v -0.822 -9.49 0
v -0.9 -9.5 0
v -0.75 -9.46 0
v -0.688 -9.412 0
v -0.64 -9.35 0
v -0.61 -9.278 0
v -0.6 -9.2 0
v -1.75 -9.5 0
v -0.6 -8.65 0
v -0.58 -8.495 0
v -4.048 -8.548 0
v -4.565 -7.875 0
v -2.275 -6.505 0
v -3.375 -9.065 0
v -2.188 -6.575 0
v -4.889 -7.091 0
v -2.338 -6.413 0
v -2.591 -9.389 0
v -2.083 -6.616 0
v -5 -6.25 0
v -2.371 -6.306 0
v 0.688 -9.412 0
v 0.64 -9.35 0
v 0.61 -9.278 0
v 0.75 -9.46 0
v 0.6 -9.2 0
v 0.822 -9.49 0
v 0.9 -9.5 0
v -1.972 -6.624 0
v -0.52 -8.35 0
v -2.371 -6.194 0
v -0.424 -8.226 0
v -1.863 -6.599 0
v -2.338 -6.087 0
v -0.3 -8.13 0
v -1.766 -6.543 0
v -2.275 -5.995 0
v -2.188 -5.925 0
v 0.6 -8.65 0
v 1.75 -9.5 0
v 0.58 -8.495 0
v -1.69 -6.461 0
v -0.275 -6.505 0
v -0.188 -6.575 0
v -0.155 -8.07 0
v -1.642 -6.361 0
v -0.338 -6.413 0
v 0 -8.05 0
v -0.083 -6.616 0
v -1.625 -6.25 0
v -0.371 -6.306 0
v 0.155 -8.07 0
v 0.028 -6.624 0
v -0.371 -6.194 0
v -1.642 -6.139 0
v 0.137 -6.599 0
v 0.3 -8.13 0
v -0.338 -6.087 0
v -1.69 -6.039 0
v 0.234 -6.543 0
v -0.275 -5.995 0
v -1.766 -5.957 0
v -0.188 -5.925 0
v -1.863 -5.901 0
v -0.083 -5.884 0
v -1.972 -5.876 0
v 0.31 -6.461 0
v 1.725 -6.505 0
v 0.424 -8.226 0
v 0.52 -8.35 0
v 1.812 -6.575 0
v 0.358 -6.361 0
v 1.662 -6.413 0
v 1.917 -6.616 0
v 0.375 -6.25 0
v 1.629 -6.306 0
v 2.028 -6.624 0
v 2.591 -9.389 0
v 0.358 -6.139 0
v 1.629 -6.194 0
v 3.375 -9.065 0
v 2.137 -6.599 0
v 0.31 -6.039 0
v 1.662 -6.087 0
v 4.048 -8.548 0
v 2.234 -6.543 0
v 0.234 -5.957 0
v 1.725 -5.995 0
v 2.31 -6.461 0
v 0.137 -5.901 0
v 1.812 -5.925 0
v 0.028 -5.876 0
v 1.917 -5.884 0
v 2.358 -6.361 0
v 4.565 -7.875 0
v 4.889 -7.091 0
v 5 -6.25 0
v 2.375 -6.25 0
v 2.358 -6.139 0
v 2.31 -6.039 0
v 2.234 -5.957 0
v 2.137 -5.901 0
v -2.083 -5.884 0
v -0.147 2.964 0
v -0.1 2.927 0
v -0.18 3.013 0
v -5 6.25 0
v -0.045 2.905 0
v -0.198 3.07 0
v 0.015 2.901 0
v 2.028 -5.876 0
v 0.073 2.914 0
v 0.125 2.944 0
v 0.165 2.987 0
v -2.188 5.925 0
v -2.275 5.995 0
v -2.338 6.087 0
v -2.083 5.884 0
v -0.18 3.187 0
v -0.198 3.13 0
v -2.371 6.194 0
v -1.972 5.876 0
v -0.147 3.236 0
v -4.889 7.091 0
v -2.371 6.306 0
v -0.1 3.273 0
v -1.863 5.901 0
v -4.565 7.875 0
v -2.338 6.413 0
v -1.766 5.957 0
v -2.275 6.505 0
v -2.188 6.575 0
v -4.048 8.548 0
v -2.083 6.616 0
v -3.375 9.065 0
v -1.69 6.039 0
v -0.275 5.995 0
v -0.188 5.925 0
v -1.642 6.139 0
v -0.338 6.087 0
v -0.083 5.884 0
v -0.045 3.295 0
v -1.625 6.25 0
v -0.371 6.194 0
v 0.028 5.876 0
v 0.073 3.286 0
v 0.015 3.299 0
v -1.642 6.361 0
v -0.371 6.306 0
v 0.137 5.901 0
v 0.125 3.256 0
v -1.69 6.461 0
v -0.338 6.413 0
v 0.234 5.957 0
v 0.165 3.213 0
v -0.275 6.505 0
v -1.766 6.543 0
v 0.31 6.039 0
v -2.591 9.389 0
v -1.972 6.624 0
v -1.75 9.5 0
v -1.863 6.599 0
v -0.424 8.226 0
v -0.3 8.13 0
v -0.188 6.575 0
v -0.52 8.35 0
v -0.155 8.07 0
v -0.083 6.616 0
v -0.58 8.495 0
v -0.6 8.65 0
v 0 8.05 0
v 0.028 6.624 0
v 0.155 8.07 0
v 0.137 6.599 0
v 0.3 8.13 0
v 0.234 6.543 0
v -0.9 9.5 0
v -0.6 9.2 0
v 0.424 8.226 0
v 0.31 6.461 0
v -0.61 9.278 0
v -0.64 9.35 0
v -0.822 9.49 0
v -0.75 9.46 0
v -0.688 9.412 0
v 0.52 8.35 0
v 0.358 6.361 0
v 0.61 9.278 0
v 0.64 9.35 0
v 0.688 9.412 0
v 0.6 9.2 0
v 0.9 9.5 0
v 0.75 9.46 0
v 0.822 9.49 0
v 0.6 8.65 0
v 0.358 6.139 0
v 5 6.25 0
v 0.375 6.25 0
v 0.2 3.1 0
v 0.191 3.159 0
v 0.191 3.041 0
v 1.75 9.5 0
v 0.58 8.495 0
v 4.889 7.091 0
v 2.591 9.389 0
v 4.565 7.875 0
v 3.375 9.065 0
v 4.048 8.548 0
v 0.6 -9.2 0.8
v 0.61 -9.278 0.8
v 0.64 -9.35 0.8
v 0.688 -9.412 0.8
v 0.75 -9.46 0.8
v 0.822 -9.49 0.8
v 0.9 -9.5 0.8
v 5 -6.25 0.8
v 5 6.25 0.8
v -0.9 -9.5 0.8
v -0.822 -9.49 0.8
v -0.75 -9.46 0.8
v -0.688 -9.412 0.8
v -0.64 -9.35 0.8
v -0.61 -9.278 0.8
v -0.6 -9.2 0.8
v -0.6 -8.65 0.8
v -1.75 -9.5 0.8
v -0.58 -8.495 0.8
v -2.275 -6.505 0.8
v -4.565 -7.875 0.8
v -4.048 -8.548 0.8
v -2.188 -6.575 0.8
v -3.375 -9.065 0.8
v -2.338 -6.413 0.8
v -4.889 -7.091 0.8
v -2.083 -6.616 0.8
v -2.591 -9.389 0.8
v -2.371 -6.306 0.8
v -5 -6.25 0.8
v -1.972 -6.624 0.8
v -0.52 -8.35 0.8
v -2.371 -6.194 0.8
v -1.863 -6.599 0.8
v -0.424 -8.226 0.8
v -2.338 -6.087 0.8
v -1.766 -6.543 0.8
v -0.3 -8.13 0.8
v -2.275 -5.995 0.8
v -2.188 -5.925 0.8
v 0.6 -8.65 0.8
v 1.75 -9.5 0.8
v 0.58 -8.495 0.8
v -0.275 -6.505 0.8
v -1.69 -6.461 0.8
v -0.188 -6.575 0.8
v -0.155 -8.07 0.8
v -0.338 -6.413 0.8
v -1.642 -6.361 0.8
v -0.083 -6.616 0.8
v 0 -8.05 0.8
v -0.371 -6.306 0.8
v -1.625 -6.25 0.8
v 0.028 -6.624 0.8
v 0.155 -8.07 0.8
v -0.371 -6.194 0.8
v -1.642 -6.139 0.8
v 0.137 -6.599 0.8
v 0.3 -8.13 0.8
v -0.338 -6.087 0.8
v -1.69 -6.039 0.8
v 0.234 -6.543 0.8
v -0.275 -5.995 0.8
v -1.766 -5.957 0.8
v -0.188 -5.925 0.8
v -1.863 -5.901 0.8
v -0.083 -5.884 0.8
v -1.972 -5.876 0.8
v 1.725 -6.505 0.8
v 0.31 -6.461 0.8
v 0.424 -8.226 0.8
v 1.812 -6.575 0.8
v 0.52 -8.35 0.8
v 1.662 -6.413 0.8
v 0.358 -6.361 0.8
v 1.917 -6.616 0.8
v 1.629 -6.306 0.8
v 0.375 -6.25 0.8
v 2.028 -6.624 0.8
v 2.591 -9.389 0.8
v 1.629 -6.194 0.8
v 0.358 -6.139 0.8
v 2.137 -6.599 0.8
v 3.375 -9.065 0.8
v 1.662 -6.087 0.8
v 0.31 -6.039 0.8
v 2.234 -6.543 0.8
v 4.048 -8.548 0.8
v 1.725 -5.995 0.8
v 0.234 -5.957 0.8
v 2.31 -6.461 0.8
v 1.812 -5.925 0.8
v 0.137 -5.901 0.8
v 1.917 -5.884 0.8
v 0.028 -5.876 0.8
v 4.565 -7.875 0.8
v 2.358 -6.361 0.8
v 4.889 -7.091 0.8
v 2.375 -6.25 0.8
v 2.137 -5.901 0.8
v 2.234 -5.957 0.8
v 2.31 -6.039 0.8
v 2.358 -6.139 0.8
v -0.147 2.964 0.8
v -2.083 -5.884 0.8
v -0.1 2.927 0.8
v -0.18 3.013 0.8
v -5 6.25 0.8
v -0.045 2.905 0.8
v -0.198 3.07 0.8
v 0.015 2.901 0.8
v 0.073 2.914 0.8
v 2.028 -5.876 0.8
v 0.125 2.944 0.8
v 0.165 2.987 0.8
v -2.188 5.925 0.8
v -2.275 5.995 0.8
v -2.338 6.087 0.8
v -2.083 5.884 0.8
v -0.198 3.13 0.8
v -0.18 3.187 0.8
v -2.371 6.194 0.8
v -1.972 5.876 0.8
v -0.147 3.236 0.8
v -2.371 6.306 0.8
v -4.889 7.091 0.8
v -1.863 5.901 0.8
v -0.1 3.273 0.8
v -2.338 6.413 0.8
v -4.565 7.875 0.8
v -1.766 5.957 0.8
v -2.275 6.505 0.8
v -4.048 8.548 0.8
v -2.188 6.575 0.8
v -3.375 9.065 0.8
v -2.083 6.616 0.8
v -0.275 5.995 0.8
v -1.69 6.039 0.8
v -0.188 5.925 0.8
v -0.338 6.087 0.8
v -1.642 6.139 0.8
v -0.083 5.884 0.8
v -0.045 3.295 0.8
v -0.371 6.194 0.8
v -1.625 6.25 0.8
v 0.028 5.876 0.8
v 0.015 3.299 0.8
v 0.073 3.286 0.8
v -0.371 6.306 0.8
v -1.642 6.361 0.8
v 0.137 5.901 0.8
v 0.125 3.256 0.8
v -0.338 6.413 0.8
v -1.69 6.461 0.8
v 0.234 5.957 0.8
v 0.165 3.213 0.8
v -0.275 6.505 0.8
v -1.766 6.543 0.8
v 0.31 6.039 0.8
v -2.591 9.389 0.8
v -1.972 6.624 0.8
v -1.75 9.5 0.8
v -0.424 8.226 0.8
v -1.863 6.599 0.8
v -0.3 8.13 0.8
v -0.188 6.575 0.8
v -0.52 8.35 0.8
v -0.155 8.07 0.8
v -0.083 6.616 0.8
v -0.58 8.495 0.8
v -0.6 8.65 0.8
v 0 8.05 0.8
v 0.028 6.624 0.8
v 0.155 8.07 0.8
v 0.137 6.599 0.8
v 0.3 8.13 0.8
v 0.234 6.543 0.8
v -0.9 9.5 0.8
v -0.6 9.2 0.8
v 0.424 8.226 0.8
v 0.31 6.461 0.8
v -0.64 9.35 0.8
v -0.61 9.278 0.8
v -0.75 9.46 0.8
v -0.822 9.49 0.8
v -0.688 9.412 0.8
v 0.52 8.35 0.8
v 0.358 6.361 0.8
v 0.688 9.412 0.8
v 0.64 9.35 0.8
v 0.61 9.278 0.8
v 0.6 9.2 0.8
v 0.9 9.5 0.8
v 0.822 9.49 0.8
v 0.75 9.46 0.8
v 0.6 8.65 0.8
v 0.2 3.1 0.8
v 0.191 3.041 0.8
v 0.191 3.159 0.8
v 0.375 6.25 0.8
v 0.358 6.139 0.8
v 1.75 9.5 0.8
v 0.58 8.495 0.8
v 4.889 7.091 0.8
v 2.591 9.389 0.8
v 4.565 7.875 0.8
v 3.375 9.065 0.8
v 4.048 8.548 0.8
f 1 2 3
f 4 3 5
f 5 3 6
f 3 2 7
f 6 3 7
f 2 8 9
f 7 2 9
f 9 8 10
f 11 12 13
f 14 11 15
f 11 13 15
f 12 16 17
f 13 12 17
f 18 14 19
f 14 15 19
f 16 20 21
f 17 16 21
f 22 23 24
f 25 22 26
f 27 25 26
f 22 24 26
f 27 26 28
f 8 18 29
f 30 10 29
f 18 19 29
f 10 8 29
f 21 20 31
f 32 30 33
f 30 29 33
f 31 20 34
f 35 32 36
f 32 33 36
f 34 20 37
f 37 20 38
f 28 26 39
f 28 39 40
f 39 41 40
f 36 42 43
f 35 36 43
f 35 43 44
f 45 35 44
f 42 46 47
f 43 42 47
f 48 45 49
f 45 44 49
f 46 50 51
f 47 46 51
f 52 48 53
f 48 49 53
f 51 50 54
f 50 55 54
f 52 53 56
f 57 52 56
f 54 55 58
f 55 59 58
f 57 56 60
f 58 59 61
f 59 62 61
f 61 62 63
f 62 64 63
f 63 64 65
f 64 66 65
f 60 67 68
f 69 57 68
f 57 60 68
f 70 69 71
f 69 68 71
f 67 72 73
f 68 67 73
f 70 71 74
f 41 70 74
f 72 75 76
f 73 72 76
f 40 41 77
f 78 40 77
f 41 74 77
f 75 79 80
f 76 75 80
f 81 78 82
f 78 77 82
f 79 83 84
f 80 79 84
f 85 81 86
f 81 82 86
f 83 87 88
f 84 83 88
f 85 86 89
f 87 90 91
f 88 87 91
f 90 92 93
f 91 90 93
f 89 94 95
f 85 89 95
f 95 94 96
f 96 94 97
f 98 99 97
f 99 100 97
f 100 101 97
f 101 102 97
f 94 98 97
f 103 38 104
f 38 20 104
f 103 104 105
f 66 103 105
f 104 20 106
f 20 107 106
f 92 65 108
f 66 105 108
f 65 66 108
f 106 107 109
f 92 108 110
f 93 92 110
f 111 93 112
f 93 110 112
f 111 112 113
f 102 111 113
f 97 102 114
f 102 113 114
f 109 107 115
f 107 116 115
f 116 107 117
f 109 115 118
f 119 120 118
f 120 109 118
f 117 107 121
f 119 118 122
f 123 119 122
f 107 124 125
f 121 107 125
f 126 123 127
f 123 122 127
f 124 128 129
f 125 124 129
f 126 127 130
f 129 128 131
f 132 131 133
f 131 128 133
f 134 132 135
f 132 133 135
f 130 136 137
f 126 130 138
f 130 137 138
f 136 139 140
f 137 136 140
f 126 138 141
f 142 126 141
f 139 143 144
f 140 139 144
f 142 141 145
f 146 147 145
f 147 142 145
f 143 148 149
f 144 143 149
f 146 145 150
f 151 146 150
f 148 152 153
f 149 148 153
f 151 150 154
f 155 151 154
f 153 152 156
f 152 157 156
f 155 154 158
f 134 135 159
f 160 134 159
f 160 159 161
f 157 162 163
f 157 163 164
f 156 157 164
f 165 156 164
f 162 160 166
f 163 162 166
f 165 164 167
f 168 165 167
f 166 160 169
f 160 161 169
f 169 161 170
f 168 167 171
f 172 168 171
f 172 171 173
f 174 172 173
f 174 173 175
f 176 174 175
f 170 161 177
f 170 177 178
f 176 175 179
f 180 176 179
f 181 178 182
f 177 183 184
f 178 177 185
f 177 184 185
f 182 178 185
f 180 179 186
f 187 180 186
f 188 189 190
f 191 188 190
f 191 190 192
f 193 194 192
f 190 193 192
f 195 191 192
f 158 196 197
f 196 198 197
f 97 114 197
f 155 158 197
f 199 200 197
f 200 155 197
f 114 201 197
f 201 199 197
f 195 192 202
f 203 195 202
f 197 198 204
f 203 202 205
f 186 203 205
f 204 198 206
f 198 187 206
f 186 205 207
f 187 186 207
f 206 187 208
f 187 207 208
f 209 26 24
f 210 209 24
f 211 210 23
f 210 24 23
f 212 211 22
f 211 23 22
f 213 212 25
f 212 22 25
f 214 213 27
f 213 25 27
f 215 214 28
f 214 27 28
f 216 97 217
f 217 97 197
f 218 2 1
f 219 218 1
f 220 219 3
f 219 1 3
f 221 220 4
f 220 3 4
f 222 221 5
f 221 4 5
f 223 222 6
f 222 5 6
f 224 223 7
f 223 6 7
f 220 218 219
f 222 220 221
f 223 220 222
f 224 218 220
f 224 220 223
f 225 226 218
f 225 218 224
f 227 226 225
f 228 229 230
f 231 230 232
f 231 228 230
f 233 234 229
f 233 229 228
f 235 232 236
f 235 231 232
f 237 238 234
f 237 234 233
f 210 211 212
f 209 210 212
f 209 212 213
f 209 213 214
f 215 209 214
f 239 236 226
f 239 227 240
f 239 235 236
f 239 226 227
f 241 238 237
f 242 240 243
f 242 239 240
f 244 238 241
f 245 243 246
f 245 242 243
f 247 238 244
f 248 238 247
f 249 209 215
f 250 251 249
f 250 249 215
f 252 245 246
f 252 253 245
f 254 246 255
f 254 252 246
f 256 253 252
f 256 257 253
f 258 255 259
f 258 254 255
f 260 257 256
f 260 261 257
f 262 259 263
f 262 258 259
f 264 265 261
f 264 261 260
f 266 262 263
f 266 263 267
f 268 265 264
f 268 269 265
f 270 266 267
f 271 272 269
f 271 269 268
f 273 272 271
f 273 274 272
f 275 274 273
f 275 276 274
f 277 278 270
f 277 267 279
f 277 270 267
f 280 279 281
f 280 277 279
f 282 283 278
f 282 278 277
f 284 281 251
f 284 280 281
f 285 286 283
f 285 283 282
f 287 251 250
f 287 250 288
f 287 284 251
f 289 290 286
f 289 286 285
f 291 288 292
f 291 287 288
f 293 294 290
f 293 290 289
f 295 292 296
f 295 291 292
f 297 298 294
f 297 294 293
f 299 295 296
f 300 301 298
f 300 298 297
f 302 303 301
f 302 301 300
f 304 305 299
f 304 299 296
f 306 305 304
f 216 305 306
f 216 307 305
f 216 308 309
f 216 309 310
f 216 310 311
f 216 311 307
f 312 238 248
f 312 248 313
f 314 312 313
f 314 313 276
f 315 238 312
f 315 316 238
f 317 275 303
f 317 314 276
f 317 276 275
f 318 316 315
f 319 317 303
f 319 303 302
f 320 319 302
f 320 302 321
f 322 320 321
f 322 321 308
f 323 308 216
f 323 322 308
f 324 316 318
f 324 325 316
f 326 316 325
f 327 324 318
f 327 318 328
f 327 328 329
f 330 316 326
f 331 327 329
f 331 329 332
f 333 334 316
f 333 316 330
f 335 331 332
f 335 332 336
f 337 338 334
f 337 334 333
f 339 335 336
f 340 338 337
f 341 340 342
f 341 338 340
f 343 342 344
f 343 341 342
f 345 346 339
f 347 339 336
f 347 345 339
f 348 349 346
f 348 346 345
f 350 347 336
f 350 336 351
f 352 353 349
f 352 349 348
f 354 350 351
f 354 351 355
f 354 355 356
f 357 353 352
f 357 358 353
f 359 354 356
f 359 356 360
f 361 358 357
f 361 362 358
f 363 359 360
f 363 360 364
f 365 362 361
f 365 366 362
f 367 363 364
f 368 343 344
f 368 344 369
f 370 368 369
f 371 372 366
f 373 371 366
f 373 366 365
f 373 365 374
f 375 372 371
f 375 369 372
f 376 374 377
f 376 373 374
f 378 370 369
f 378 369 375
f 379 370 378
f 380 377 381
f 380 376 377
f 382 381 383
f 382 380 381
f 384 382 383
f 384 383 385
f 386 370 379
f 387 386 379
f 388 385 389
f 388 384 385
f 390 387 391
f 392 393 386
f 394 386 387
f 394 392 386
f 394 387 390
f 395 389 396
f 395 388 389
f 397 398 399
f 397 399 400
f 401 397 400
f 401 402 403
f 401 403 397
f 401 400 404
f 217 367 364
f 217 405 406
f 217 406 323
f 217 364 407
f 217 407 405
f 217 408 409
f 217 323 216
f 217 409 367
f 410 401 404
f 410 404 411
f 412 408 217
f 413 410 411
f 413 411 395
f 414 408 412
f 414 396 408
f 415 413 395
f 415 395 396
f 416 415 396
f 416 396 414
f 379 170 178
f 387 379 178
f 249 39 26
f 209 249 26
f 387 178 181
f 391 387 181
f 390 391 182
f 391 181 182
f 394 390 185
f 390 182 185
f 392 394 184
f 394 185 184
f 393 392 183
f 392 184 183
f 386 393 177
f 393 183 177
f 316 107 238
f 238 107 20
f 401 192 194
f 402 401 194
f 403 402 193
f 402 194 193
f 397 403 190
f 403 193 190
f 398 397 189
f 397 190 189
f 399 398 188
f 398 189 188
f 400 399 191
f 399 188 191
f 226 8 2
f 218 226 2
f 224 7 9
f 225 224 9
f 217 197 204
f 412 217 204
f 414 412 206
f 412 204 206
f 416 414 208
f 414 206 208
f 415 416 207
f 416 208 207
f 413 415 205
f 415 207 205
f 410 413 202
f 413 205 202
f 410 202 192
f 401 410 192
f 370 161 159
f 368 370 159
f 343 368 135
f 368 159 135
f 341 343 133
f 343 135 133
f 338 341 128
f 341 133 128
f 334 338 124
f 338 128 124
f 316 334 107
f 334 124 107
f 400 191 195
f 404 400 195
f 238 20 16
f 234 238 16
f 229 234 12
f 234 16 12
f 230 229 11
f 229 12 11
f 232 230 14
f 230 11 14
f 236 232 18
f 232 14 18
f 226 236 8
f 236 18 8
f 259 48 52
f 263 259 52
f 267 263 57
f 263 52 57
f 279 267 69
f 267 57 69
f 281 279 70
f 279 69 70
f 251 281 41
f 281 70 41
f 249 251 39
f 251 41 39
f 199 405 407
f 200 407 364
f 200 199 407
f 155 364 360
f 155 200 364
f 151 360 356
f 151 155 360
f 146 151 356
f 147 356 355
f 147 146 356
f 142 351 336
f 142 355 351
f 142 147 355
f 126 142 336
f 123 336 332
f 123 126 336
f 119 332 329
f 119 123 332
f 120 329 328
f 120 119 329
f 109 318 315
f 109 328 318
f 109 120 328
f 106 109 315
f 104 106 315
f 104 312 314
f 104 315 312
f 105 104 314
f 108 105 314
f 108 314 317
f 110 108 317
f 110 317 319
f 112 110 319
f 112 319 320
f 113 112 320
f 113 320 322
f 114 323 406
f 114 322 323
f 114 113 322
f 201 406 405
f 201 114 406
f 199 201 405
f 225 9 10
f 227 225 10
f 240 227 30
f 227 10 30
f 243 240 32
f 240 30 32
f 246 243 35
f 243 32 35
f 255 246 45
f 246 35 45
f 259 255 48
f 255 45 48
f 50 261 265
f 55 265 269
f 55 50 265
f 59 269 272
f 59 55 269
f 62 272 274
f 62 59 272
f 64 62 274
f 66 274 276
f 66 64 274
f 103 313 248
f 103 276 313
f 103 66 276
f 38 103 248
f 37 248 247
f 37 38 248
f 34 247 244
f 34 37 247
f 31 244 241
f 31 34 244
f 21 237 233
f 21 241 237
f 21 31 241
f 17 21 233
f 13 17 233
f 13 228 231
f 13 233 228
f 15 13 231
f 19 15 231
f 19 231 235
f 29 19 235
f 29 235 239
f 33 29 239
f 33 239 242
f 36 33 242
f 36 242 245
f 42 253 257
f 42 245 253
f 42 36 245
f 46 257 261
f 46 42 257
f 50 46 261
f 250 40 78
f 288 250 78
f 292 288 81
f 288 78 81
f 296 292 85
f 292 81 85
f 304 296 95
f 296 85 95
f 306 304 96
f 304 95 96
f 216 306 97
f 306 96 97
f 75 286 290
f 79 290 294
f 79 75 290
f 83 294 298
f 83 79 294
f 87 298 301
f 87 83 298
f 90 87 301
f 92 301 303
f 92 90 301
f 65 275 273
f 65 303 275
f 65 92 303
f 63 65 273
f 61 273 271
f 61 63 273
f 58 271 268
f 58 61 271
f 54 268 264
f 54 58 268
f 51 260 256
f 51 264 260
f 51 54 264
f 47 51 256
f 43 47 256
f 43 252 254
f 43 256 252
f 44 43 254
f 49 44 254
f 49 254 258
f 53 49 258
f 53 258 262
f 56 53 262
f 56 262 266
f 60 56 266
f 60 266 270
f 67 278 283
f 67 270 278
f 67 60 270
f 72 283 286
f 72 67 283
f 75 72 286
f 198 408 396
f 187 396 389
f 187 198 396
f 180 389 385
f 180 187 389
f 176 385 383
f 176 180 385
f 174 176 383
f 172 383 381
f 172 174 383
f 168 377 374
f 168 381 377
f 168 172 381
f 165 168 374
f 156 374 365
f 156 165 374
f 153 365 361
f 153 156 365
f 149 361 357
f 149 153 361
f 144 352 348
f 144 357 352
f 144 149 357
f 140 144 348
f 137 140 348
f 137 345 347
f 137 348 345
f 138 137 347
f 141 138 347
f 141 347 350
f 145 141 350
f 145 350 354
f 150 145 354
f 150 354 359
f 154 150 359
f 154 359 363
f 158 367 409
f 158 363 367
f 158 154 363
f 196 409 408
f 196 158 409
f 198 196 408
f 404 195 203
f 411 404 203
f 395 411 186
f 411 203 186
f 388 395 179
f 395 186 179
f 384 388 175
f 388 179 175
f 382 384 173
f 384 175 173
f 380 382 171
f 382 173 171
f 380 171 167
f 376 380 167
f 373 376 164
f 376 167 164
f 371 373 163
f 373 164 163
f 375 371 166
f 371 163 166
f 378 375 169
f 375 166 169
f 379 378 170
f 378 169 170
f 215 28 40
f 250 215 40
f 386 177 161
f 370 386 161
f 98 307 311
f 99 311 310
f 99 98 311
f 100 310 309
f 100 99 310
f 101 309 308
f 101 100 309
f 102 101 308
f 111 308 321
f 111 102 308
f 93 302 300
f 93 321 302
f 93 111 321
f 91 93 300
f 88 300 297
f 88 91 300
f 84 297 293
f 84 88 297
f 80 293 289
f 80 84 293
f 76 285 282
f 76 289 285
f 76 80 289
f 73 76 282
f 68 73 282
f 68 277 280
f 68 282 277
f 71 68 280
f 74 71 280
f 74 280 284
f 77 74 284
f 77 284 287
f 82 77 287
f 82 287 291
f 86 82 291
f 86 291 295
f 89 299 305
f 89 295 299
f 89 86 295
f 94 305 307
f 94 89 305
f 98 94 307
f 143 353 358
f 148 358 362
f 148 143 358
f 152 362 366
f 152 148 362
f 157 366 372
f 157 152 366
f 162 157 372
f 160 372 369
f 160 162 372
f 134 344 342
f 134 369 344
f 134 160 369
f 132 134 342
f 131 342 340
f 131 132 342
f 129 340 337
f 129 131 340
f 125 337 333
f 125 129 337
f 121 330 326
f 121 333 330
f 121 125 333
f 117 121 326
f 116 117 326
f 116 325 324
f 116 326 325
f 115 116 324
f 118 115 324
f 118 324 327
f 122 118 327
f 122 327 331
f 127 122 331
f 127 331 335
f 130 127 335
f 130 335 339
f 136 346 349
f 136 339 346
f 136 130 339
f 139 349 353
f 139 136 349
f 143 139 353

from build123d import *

# Parameters (mm, degrees)
BOARD_DEPTH            = 0.8
SKETCH2_R              = 0.375
NON_PLATED_HOLES_DEPTH = 11.765221781
SKETCH3_R              = 0.2
PLATED_HOLES_DEPTH     = 11.765221781


with BuildPart() as part:
    # Sketch1 → BOARD (new body)
    with BuildSketch(Plane.XY):
        with BuildLine():
            Line((-0.6, 8.65), (-0.6, 9.2))
            ThreePointArc((-0.6, 9.2), (-0.687867966, 9.412132034), (-0.9, 9.5))
            Line((-0.9, 9.5), (-1.75, 9.5))
            ThreePointArc((-1.75, 9.5), (-4.048097039, 8.548097039), (-5, 6.25))
            Line((-5, 6.25), (-5, -6.25))
            ThreePointArc((-5, -6.25), (-4.048097039, -8.548097039), (-1.75, -9.5))
            Line((-1.75, -9.5), (-0.9, -9.5))
            ThreePointArc((-0.9, -9.5), (-0.687867966, -9.412132034), (-0.6, -9.2))
            Line((-0.6, -9.2), (-0.6, -8.65))
            ThreePointArc((-0.6, -8.65), (-0.424264069, -8.225735931), (0, -8.05))
            ThreePointArc((0, -8.05), (0.424264069, -8.225735931), (0.6, -8.65))
            Line((0.6, -8.65), (0.6, -9.2))
            ThreePointArc((0.6, -9.2), (0.687867966, -9.412132034), (0.9, -9.5))
            Line((0.9, -9.5), (1.75, -9.5))
            ThreePointArc((1.75, -9.5), (4.048097039, -8.548097039), (5, -6.25))
            Line((5, -6.25), (5, 6.25))
            ThreePointArc((5, 6.25), (4.048097039, 8.548097039), (1.75, 9.5))
            Line((1.75, 9.5), (0.9, 9.5))
            ThreePointArc((0.9, 9.5), (0.687867966, 9.412132034), (0.6, 9.2))
            Line((0.6, 9.2), (0.6, 8.65))
            ThreePointArc((0.6, 8.65), (0.424264069, 8.225735931), (0, 8.05))
            ThreePointArc((0, 8.05), (-0.424264069, 8.225735931), (-0.6, 8.65))
        make_face()
    extrude(amount=BOARD_DEPTH)

    # Sketch2 → NON-PLATED HOLES (cut, through all)
    with BuildSketch(Plane.XY):
        with Locations((2, -6.25)):
            Circle(SKETCH2_R)
        with Locations((0, -6.25)):
            Circle(SKETCH2_R)
        with Locations((-2, -6.25)):
            Circle(SKETCH2_R)
        with Locations((-2, 6.25)):
            Circle(SKETCH2_R)
        with Locations((0, 6.25)):
            Circle(SKETCH2_R)
    extrude(amount=NON_PLATED_HOLES_DEPTH, mode=Mode.SUBTRACT)

    # Sketch3 → PLATED HOLES (cut, through all)
    with BuildSketch(Plane.XY):
        with Locations((0, 3.1)):
            Circle(SKETCH3_R)
    extrude(amount=PLATED_HOLES_DEPTH, mode=Mode.SUBTRACT)


solid = part.part
